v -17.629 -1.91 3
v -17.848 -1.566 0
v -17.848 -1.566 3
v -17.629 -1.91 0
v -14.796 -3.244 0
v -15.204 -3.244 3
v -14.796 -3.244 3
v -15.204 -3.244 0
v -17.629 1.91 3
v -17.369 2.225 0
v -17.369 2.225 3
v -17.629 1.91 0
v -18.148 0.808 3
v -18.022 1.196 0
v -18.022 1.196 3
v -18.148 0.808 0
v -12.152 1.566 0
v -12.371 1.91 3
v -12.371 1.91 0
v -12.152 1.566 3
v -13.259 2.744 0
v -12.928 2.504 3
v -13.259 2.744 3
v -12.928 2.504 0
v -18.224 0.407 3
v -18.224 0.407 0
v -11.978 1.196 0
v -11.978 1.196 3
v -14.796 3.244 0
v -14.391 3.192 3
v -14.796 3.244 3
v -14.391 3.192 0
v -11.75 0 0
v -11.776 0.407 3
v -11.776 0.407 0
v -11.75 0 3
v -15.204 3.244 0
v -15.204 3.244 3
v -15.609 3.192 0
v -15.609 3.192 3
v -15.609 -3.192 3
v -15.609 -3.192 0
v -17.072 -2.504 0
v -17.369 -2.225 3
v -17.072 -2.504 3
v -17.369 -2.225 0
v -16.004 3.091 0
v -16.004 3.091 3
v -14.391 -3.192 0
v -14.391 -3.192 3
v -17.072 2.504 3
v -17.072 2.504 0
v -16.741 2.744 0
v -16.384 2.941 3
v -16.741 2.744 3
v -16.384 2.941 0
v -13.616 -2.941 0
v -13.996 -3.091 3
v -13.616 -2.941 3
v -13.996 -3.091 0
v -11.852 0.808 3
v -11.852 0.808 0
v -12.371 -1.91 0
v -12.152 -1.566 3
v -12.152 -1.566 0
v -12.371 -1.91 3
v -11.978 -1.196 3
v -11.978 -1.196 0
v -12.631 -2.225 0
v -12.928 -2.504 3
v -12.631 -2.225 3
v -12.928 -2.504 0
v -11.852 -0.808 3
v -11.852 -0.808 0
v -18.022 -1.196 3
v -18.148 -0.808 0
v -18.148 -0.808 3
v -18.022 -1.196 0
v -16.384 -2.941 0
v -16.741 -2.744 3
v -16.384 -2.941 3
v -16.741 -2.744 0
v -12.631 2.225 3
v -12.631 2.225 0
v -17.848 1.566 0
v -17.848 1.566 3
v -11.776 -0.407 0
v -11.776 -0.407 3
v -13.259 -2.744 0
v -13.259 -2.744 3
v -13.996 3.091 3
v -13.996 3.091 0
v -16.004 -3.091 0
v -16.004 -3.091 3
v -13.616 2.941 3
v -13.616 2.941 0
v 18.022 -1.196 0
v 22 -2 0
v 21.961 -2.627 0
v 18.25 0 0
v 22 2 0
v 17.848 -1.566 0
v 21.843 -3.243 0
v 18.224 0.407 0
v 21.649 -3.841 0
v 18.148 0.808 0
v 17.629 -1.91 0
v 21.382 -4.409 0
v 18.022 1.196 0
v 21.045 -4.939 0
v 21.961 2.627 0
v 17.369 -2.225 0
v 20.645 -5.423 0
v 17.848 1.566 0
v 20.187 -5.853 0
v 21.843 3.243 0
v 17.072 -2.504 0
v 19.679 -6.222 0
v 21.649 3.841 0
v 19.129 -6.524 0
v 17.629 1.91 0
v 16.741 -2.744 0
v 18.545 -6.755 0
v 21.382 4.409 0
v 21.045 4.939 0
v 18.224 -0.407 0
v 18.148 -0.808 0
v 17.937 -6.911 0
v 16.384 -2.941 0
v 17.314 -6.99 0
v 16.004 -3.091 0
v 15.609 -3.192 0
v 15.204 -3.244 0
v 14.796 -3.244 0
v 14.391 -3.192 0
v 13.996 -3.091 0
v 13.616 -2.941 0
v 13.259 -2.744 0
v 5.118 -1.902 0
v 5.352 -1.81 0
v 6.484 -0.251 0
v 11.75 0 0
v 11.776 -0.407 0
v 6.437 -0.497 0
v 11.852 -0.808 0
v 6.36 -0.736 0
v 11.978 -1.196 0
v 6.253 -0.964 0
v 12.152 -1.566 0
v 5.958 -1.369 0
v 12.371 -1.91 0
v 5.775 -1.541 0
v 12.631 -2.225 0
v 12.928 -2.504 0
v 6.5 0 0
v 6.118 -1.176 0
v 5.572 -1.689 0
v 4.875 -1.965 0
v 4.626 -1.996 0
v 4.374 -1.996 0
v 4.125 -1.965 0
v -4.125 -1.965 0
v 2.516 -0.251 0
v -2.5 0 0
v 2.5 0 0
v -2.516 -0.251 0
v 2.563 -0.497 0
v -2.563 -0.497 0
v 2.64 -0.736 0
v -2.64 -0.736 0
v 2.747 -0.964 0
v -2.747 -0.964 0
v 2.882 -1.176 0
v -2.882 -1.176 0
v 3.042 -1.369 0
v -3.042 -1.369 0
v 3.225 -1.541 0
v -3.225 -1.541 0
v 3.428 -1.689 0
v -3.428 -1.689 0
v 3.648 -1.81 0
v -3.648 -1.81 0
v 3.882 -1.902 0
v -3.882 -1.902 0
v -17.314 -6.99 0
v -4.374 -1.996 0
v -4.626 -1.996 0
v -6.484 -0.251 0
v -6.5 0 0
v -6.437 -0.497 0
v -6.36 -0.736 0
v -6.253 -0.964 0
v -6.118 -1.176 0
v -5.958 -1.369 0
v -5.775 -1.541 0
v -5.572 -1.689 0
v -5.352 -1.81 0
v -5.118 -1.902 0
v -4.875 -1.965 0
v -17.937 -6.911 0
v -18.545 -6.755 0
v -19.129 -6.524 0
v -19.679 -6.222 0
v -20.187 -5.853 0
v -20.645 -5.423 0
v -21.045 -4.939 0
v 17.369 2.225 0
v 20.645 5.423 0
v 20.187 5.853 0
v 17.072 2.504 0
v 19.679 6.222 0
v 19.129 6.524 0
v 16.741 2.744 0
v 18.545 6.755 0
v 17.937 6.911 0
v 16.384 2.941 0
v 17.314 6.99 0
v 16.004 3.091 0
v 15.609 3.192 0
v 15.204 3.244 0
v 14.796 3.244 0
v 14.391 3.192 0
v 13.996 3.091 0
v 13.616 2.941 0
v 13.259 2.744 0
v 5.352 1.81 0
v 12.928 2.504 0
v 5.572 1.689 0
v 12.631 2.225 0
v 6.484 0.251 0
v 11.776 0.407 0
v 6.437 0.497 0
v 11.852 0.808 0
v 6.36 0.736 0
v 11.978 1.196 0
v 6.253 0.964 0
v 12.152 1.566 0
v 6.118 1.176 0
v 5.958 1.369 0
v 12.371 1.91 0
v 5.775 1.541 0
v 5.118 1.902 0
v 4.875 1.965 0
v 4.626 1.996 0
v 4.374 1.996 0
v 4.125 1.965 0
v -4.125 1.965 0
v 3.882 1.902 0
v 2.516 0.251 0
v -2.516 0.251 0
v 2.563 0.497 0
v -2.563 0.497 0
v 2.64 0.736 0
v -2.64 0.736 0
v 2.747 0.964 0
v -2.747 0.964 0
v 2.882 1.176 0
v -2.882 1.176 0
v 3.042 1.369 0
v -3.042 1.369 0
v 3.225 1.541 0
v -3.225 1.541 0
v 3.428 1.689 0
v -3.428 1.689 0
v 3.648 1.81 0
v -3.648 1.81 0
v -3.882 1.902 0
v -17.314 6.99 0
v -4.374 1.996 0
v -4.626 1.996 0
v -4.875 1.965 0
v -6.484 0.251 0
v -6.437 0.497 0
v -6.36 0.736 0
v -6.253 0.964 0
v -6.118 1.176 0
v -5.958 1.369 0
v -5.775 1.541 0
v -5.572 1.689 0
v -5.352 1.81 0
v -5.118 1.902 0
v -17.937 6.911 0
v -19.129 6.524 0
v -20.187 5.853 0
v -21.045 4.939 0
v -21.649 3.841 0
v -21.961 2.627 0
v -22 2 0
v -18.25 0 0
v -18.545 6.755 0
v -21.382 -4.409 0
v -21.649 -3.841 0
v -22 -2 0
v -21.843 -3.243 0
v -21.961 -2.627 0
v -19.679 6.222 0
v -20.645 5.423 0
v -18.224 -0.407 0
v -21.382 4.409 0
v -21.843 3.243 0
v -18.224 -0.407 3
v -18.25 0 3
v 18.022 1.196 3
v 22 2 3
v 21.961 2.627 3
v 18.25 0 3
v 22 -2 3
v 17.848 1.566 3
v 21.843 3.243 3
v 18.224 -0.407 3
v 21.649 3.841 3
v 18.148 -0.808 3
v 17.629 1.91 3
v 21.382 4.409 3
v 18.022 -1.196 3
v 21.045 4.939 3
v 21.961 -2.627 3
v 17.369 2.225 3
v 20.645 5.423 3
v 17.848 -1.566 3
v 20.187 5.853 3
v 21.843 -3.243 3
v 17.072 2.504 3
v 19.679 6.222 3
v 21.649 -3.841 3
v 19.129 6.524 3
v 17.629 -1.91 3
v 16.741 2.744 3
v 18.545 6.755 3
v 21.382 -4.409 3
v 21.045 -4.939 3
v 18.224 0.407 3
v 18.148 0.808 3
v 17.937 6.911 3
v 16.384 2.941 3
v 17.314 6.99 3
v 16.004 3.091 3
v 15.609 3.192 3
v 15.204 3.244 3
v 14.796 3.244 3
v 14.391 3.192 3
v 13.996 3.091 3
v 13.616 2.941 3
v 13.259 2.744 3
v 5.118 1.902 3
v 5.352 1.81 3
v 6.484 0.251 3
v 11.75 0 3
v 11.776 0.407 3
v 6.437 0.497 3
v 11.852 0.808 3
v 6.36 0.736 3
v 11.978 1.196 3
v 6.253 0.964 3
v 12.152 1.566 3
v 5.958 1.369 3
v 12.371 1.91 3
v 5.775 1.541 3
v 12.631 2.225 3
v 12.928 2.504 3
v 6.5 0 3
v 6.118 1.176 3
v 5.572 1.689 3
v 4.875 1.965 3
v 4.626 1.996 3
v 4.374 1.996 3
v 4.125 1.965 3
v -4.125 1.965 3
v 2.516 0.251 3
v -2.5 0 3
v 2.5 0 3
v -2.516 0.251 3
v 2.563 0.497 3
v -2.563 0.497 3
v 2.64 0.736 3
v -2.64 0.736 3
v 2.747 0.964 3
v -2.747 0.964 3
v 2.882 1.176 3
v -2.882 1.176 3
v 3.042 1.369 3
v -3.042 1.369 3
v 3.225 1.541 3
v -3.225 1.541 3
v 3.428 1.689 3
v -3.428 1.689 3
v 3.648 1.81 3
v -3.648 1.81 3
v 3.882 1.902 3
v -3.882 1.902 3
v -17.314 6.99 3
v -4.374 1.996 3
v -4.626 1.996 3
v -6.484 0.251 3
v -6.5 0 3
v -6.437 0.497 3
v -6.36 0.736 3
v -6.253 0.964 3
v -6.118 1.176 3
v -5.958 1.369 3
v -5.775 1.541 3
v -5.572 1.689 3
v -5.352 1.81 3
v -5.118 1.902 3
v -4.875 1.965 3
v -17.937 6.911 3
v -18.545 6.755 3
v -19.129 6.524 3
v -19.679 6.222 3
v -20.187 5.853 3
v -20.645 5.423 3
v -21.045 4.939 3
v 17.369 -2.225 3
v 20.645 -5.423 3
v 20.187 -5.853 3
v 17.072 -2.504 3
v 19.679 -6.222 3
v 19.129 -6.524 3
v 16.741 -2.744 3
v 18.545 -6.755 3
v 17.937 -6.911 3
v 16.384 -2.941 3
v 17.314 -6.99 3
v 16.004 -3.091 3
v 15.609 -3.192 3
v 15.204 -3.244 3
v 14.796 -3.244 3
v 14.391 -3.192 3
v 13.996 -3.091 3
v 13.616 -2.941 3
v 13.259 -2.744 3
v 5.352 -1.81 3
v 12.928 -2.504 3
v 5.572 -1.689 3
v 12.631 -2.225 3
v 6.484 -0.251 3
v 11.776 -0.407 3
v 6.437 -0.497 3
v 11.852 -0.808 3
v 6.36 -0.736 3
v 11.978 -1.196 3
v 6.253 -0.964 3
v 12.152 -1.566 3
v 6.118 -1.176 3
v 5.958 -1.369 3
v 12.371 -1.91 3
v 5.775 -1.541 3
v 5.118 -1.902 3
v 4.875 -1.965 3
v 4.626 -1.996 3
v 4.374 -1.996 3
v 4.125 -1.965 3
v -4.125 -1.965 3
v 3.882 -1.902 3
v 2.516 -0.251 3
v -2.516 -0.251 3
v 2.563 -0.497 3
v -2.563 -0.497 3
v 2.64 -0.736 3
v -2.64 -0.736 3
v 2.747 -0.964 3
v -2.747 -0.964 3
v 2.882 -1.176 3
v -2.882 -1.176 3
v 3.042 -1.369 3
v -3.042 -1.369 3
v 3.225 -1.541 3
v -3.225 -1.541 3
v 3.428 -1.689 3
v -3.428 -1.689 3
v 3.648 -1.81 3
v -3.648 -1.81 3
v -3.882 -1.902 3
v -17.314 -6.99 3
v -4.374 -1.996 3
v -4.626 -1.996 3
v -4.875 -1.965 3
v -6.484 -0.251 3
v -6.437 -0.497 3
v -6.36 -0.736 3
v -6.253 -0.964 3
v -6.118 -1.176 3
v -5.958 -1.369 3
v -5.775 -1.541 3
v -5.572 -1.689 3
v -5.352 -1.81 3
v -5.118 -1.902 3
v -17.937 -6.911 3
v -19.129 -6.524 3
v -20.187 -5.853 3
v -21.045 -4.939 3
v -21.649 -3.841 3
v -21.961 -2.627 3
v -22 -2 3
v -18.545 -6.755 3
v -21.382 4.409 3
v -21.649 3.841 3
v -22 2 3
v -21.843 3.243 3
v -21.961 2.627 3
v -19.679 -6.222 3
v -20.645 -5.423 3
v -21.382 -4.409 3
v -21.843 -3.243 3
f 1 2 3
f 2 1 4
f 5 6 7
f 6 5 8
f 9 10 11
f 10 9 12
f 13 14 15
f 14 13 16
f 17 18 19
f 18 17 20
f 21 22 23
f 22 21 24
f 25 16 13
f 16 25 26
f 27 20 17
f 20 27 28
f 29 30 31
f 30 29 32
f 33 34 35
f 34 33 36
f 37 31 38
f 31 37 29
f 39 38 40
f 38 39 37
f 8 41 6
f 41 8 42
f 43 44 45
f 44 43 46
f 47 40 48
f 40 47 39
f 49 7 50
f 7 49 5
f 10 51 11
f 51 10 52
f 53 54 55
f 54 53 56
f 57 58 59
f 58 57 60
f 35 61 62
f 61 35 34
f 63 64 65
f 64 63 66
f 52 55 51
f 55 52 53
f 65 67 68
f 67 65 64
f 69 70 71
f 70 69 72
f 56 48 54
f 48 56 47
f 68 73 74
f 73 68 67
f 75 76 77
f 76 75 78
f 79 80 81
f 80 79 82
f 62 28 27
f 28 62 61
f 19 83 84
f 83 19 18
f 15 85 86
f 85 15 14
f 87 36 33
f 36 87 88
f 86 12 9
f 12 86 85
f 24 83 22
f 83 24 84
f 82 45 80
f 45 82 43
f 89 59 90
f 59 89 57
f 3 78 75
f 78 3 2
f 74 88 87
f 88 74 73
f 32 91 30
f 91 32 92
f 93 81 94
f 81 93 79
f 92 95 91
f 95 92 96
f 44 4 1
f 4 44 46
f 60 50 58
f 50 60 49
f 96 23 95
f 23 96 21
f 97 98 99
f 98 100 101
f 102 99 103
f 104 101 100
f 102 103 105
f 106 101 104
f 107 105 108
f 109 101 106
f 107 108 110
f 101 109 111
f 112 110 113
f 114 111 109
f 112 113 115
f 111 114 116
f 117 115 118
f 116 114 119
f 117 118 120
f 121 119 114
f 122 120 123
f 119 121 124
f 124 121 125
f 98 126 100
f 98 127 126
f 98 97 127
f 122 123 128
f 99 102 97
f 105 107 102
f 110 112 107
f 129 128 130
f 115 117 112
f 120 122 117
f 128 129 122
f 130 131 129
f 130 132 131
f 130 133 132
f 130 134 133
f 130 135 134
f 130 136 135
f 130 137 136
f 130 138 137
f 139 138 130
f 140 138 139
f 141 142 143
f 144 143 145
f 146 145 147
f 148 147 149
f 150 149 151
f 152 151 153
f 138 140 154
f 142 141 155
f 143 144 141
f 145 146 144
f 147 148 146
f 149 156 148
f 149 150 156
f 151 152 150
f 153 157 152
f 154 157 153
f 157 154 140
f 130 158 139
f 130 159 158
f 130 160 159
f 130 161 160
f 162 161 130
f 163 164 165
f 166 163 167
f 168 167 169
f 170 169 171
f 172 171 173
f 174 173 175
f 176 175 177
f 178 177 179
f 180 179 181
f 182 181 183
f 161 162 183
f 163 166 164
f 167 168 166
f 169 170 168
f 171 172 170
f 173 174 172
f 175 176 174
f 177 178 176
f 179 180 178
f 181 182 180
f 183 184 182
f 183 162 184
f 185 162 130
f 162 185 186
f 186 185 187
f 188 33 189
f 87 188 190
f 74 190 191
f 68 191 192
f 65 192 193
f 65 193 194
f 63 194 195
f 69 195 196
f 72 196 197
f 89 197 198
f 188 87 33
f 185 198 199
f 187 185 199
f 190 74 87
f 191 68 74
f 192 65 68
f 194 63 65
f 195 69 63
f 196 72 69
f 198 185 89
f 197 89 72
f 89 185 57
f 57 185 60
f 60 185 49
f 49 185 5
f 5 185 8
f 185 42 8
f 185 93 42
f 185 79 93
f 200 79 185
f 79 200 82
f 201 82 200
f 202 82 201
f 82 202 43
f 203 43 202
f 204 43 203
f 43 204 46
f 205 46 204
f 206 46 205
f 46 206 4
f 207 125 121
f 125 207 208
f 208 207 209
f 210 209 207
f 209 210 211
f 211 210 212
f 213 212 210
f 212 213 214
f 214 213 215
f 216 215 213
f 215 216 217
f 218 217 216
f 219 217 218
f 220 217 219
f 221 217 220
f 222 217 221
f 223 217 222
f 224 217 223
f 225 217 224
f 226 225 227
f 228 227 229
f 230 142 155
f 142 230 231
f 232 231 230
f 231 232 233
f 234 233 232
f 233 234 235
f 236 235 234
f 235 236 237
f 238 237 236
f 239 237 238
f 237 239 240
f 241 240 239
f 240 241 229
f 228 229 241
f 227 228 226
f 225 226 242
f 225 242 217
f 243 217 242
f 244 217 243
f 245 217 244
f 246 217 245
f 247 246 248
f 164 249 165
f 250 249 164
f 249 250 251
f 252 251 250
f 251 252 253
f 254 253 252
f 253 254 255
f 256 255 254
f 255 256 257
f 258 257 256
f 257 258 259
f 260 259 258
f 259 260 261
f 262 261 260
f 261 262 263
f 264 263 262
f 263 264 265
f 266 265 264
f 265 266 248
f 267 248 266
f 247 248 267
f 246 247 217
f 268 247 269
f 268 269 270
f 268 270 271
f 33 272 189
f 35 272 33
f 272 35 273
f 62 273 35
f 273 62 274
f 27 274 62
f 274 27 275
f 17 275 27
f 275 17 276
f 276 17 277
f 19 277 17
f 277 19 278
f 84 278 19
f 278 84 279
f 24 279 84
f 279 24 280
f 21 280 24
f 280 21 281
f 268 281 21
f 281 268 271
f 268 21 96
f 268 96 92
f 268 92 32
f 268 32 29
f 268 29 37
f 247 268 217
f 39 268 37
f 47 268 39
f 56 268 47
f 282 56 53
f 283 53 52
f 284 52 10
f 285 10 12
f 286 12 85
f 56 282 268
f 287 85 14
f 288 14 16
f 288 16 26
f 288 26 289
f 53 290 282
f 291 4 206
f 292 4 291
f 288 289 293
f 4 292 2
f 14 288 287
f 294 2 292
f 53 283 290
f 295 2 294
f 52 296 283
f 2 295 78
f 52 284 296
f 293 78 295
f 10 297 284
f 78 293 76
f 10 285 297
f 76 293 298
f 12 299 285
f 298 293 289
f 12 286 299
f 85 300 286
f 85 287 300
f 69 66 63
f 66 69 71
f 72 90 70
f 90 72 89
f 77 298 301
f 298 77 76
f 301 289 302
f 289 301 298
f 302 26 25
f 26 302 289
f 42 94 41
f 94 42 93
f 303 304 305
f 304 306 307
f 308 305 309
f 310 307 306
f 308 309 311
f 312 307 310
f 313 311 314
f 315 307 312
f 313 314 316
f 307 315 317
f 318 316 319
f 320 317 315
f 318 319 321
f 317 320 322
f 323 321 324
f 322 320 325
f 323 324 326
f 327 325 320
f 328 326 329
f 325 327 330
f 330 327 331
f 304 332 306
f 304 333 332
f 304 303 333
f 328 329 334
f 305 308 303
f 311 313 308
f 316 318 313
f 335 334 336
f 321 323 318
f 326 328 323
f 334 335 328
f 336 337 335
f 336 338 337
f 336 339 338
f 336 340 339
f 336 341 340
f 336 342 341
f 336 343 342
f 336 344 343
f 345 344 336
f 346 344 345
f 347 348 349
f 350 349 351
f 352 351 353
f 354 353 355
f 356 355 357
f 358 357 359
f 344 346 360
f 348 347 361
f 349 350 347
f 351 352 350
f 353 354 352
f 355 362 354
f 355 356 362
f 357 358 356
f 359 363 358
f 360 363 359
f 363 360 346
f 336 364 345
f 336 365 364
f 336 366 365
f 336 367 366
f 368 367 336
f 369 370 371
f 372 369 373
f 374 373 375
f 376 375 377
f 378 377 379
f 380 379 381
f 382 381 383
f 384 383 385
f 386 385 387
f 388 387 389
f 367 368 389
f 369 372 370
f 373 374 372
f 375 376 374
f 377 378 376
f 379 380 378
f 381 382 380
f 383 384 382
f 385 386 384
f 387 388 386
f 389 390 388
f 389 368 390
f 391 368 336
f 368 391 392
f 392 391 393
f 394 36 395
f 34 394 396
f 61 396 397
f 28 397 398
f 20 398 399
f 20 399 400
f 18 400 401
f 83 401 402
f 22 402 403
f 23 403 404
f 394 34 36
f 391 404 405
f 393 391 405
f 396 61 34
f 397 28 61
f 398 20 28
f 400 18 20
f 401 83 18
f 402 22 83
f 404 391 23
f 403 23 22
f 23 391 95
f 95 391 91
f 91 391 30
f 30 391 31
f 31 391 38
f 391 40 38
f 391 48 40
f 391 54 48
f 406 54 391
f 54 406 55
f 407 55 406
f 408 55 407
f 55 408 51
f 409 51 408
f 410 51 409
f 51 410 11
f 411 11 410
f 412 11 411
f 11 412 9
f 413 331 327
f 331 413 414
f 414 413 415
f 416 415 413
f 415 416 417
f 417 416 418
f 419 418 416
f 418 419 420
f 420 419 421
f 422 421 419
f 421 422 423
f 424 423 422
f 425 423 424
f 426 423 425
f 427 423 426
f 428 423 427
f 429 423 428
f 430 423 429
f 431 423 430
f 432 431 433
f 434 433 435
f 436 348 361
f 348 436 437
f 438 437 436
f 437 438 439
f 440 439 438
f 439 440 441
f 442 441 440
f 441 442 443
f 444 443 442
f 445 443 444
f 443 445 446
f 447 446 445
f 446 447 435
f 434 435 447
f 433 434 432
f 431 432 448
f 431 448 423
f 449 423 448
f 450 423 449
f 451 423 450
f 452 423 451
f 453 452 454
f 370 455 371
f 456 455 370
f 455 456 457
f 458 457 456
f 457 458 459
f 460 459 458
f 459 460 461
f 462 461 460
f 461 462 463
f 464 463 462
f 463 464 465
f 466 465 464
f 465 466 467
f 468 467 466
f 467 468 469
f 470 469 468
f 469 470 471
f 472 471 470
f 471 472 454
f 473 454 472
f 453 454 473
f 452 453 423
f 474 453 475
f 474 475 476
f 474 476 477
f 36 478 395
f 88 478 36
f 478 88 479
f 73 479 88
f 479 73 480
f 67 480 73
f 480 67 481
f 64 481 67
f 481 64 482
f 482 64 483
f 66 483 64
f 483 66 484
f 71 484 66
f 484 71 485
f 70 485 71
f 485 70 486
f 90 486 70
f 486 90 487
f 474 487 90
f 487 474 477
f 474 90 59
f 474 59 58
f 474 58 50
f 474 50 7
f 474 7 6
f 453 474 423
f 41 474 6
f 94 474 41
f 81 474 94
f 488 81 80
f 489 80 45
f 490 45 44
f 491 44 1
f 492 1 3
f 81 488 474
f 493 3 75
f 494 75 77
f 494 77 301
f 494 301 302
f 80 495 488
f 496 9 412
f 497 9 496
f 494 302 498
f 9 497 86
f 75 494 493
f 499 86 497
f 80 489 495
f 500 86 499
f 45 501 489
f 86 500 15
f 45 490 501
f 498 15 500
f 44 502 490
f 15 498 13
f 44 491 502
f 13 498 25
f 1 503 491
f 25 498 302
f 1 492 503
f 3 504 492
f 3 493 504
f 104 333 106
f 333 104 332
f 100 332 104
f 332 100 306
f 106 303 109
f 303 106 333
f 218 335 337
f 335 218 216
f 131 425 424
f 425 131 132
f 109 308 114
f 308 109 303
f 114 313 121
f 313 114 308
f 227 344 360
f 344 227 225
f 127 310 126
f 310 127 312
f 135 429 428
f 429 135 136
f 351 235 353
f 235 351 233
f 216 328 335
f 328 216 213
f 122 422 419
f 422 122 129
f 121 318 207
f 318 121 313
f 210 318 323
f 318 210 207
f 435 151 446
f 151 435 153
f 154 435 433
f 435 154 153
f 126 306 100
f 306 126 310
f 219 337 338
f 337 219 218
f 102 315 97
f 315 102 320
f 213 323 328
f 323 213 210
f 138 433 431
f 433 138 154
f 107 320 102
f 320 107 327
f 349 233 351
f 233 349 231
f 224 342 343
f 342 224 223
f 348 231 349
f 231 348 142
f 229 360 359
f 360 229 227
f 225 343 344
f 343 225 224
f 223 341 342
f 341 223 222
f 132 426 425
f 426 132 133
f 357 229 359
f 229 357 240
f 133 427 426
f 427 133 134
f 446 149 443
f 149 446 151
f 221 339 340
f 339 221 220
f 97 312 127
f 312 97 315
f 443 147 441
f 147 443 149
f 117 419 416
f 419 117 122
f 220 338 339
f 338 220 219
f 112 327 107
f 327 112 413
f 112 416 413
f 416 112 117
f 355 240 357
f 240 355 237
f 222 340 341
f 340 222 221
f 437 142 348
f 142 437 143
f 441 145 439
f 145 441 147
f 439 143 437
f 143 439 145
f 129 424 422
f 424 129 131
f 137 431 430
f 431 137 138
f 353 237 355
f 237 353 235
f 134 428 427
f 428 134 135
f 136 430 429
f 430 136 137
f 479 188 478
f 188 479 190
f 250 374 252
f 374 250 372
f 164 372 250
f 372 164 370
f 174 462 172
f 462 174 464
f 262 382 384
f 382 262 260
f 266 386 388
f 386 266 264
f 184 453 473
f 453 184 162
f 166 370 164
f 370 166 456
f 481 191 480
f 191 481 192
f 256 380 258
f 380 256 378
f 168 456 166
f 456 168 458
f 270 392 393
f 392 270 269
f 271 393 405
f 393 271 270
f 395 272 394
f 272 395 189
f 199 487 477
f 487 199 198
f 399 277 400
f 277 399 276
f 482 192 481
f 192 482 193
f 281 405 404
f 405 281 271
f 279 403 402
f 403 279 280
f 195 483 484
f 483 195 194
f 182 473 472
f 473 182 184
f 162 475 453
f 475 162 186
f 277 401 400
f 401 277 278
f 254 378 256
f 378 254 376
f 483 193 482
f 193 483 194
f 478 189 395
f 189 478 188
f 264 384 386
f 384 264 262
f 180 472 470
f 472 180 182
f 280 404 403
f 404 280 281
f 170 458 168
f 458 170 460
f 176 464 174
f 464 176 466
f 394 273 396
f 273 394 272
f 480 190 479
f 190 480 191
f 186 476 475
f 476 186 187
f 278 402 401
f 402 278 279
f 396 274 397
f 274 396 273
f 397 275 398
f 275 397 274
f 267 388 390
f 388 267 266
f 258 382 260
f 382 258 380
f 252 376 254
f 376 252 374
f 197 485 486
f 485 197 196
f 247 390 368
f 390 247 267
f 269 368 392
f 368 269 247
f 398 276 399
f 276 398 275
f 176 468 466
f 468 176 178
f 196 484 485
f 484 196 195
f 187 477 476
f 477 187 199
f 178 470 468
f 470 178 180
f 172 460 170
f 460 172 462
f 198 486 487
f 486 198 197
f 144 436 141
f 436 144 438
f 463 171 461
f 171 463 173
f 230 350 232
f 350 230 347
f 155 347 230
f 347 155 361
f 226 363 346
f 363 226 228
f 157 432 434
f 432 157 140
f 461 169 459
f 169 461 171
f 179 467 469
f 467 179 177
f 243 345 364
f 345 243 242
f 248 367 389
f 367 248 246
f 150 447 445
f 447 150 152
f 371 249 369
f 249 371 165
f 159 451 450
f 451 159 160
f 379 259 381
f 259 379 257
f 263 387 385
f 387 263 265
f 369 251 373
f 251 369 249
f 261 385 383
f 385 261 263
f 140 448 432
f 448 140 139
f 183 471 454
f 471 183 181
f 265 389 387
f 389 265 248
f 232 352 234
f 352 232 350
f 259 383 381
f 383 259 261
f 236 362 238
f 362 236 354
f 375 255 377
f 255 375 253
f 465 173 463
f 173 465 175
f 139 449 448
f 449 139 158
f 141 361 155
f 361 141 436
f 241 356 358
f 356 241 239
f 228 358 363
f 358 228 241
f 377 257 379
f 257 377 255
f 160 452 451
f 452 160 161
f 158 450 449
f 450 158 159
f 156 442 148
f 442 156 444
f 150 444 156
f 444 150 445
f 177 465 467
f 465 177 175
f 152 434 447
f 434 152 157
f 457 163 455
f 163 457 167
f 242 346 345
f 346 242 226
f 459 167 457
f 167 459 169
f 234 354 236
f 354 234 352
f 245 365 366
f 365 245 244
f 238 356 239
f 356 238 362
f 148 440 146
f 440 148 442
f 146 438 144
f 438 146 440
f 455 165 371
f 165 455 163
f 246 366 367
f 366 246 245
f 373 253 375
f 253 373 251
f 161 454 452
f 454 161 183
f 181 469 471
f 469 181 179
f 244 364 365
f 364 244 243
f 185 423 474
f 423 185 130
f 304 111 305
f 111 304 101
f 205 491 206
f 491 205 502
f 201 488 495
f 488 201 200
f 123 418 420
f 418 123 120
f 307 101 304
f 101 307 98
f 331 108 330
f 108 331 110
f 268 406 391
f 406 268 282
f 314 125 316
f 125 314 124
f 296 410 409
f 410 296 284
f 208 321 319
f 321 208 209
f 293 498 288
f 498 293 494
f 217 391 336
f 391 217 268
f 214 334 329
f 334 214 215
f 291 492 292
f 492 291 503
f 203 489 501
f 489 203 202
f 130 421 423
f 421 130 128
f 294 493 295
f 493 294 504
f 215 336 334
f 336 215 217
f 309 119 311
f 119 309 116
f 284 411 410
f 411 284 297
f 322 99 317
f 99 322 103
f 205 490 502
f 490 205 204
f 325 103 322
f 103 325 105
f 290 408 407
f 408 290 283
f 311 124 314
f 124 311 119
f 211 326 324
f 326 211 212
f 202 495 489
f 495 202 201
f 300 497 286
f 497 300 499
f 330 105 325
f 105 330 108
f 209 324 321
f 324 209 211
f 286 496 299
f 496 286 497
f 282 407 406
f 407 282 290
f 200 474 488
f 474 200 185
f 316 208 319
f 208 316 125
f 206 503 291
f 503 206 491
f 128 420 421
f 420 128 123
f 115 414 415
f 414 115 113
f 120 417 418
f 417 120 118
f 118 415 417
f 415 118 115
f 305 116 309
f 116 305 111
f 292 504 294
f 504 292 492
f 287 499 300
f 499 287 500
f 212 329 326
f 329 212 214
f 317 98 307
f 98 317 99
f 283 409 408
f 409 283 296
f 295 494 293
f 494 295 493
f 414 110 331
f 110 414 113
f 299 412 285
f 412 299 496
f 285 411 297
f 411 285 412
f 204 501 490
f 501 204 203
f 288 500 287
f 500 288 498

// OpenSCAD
$fn = 50;

difference() {
	union() {
		hull() {
			translate(v = [-17.0, 2.0, 0]) {
				cylinder(h = 3, r = 5);
			}
			translate(v = [17.0, 2.0, 0]) {
				cylinder(h = 3, r = 5);
			}
			translate(v = [-17.0, -2.0, 0]) {
				cylinder(h = 3, r = 5);
			}
			translate(v = [17.0, -2.0, 0]) {
				cylinder(h = 3, r = 5);
			}
		}
	}
	union() {
		translate(v = [-15.0, 0.0, 0]) {
			cylinder(h = 3, r = 3.25);
		}
		translate(v = [15.0, 0.0, 0]) {
			cylinder(h = 3, r = 3.25);
		}
		translate(v = [-4.5, 0, 0.0]) {
			cylinder(h = 3, r = 2.0);
		}
		translate(v = [4.5, 0, 0.0]) {
			cylinder(h = 3, r = 2.0);
		}
	}
}
